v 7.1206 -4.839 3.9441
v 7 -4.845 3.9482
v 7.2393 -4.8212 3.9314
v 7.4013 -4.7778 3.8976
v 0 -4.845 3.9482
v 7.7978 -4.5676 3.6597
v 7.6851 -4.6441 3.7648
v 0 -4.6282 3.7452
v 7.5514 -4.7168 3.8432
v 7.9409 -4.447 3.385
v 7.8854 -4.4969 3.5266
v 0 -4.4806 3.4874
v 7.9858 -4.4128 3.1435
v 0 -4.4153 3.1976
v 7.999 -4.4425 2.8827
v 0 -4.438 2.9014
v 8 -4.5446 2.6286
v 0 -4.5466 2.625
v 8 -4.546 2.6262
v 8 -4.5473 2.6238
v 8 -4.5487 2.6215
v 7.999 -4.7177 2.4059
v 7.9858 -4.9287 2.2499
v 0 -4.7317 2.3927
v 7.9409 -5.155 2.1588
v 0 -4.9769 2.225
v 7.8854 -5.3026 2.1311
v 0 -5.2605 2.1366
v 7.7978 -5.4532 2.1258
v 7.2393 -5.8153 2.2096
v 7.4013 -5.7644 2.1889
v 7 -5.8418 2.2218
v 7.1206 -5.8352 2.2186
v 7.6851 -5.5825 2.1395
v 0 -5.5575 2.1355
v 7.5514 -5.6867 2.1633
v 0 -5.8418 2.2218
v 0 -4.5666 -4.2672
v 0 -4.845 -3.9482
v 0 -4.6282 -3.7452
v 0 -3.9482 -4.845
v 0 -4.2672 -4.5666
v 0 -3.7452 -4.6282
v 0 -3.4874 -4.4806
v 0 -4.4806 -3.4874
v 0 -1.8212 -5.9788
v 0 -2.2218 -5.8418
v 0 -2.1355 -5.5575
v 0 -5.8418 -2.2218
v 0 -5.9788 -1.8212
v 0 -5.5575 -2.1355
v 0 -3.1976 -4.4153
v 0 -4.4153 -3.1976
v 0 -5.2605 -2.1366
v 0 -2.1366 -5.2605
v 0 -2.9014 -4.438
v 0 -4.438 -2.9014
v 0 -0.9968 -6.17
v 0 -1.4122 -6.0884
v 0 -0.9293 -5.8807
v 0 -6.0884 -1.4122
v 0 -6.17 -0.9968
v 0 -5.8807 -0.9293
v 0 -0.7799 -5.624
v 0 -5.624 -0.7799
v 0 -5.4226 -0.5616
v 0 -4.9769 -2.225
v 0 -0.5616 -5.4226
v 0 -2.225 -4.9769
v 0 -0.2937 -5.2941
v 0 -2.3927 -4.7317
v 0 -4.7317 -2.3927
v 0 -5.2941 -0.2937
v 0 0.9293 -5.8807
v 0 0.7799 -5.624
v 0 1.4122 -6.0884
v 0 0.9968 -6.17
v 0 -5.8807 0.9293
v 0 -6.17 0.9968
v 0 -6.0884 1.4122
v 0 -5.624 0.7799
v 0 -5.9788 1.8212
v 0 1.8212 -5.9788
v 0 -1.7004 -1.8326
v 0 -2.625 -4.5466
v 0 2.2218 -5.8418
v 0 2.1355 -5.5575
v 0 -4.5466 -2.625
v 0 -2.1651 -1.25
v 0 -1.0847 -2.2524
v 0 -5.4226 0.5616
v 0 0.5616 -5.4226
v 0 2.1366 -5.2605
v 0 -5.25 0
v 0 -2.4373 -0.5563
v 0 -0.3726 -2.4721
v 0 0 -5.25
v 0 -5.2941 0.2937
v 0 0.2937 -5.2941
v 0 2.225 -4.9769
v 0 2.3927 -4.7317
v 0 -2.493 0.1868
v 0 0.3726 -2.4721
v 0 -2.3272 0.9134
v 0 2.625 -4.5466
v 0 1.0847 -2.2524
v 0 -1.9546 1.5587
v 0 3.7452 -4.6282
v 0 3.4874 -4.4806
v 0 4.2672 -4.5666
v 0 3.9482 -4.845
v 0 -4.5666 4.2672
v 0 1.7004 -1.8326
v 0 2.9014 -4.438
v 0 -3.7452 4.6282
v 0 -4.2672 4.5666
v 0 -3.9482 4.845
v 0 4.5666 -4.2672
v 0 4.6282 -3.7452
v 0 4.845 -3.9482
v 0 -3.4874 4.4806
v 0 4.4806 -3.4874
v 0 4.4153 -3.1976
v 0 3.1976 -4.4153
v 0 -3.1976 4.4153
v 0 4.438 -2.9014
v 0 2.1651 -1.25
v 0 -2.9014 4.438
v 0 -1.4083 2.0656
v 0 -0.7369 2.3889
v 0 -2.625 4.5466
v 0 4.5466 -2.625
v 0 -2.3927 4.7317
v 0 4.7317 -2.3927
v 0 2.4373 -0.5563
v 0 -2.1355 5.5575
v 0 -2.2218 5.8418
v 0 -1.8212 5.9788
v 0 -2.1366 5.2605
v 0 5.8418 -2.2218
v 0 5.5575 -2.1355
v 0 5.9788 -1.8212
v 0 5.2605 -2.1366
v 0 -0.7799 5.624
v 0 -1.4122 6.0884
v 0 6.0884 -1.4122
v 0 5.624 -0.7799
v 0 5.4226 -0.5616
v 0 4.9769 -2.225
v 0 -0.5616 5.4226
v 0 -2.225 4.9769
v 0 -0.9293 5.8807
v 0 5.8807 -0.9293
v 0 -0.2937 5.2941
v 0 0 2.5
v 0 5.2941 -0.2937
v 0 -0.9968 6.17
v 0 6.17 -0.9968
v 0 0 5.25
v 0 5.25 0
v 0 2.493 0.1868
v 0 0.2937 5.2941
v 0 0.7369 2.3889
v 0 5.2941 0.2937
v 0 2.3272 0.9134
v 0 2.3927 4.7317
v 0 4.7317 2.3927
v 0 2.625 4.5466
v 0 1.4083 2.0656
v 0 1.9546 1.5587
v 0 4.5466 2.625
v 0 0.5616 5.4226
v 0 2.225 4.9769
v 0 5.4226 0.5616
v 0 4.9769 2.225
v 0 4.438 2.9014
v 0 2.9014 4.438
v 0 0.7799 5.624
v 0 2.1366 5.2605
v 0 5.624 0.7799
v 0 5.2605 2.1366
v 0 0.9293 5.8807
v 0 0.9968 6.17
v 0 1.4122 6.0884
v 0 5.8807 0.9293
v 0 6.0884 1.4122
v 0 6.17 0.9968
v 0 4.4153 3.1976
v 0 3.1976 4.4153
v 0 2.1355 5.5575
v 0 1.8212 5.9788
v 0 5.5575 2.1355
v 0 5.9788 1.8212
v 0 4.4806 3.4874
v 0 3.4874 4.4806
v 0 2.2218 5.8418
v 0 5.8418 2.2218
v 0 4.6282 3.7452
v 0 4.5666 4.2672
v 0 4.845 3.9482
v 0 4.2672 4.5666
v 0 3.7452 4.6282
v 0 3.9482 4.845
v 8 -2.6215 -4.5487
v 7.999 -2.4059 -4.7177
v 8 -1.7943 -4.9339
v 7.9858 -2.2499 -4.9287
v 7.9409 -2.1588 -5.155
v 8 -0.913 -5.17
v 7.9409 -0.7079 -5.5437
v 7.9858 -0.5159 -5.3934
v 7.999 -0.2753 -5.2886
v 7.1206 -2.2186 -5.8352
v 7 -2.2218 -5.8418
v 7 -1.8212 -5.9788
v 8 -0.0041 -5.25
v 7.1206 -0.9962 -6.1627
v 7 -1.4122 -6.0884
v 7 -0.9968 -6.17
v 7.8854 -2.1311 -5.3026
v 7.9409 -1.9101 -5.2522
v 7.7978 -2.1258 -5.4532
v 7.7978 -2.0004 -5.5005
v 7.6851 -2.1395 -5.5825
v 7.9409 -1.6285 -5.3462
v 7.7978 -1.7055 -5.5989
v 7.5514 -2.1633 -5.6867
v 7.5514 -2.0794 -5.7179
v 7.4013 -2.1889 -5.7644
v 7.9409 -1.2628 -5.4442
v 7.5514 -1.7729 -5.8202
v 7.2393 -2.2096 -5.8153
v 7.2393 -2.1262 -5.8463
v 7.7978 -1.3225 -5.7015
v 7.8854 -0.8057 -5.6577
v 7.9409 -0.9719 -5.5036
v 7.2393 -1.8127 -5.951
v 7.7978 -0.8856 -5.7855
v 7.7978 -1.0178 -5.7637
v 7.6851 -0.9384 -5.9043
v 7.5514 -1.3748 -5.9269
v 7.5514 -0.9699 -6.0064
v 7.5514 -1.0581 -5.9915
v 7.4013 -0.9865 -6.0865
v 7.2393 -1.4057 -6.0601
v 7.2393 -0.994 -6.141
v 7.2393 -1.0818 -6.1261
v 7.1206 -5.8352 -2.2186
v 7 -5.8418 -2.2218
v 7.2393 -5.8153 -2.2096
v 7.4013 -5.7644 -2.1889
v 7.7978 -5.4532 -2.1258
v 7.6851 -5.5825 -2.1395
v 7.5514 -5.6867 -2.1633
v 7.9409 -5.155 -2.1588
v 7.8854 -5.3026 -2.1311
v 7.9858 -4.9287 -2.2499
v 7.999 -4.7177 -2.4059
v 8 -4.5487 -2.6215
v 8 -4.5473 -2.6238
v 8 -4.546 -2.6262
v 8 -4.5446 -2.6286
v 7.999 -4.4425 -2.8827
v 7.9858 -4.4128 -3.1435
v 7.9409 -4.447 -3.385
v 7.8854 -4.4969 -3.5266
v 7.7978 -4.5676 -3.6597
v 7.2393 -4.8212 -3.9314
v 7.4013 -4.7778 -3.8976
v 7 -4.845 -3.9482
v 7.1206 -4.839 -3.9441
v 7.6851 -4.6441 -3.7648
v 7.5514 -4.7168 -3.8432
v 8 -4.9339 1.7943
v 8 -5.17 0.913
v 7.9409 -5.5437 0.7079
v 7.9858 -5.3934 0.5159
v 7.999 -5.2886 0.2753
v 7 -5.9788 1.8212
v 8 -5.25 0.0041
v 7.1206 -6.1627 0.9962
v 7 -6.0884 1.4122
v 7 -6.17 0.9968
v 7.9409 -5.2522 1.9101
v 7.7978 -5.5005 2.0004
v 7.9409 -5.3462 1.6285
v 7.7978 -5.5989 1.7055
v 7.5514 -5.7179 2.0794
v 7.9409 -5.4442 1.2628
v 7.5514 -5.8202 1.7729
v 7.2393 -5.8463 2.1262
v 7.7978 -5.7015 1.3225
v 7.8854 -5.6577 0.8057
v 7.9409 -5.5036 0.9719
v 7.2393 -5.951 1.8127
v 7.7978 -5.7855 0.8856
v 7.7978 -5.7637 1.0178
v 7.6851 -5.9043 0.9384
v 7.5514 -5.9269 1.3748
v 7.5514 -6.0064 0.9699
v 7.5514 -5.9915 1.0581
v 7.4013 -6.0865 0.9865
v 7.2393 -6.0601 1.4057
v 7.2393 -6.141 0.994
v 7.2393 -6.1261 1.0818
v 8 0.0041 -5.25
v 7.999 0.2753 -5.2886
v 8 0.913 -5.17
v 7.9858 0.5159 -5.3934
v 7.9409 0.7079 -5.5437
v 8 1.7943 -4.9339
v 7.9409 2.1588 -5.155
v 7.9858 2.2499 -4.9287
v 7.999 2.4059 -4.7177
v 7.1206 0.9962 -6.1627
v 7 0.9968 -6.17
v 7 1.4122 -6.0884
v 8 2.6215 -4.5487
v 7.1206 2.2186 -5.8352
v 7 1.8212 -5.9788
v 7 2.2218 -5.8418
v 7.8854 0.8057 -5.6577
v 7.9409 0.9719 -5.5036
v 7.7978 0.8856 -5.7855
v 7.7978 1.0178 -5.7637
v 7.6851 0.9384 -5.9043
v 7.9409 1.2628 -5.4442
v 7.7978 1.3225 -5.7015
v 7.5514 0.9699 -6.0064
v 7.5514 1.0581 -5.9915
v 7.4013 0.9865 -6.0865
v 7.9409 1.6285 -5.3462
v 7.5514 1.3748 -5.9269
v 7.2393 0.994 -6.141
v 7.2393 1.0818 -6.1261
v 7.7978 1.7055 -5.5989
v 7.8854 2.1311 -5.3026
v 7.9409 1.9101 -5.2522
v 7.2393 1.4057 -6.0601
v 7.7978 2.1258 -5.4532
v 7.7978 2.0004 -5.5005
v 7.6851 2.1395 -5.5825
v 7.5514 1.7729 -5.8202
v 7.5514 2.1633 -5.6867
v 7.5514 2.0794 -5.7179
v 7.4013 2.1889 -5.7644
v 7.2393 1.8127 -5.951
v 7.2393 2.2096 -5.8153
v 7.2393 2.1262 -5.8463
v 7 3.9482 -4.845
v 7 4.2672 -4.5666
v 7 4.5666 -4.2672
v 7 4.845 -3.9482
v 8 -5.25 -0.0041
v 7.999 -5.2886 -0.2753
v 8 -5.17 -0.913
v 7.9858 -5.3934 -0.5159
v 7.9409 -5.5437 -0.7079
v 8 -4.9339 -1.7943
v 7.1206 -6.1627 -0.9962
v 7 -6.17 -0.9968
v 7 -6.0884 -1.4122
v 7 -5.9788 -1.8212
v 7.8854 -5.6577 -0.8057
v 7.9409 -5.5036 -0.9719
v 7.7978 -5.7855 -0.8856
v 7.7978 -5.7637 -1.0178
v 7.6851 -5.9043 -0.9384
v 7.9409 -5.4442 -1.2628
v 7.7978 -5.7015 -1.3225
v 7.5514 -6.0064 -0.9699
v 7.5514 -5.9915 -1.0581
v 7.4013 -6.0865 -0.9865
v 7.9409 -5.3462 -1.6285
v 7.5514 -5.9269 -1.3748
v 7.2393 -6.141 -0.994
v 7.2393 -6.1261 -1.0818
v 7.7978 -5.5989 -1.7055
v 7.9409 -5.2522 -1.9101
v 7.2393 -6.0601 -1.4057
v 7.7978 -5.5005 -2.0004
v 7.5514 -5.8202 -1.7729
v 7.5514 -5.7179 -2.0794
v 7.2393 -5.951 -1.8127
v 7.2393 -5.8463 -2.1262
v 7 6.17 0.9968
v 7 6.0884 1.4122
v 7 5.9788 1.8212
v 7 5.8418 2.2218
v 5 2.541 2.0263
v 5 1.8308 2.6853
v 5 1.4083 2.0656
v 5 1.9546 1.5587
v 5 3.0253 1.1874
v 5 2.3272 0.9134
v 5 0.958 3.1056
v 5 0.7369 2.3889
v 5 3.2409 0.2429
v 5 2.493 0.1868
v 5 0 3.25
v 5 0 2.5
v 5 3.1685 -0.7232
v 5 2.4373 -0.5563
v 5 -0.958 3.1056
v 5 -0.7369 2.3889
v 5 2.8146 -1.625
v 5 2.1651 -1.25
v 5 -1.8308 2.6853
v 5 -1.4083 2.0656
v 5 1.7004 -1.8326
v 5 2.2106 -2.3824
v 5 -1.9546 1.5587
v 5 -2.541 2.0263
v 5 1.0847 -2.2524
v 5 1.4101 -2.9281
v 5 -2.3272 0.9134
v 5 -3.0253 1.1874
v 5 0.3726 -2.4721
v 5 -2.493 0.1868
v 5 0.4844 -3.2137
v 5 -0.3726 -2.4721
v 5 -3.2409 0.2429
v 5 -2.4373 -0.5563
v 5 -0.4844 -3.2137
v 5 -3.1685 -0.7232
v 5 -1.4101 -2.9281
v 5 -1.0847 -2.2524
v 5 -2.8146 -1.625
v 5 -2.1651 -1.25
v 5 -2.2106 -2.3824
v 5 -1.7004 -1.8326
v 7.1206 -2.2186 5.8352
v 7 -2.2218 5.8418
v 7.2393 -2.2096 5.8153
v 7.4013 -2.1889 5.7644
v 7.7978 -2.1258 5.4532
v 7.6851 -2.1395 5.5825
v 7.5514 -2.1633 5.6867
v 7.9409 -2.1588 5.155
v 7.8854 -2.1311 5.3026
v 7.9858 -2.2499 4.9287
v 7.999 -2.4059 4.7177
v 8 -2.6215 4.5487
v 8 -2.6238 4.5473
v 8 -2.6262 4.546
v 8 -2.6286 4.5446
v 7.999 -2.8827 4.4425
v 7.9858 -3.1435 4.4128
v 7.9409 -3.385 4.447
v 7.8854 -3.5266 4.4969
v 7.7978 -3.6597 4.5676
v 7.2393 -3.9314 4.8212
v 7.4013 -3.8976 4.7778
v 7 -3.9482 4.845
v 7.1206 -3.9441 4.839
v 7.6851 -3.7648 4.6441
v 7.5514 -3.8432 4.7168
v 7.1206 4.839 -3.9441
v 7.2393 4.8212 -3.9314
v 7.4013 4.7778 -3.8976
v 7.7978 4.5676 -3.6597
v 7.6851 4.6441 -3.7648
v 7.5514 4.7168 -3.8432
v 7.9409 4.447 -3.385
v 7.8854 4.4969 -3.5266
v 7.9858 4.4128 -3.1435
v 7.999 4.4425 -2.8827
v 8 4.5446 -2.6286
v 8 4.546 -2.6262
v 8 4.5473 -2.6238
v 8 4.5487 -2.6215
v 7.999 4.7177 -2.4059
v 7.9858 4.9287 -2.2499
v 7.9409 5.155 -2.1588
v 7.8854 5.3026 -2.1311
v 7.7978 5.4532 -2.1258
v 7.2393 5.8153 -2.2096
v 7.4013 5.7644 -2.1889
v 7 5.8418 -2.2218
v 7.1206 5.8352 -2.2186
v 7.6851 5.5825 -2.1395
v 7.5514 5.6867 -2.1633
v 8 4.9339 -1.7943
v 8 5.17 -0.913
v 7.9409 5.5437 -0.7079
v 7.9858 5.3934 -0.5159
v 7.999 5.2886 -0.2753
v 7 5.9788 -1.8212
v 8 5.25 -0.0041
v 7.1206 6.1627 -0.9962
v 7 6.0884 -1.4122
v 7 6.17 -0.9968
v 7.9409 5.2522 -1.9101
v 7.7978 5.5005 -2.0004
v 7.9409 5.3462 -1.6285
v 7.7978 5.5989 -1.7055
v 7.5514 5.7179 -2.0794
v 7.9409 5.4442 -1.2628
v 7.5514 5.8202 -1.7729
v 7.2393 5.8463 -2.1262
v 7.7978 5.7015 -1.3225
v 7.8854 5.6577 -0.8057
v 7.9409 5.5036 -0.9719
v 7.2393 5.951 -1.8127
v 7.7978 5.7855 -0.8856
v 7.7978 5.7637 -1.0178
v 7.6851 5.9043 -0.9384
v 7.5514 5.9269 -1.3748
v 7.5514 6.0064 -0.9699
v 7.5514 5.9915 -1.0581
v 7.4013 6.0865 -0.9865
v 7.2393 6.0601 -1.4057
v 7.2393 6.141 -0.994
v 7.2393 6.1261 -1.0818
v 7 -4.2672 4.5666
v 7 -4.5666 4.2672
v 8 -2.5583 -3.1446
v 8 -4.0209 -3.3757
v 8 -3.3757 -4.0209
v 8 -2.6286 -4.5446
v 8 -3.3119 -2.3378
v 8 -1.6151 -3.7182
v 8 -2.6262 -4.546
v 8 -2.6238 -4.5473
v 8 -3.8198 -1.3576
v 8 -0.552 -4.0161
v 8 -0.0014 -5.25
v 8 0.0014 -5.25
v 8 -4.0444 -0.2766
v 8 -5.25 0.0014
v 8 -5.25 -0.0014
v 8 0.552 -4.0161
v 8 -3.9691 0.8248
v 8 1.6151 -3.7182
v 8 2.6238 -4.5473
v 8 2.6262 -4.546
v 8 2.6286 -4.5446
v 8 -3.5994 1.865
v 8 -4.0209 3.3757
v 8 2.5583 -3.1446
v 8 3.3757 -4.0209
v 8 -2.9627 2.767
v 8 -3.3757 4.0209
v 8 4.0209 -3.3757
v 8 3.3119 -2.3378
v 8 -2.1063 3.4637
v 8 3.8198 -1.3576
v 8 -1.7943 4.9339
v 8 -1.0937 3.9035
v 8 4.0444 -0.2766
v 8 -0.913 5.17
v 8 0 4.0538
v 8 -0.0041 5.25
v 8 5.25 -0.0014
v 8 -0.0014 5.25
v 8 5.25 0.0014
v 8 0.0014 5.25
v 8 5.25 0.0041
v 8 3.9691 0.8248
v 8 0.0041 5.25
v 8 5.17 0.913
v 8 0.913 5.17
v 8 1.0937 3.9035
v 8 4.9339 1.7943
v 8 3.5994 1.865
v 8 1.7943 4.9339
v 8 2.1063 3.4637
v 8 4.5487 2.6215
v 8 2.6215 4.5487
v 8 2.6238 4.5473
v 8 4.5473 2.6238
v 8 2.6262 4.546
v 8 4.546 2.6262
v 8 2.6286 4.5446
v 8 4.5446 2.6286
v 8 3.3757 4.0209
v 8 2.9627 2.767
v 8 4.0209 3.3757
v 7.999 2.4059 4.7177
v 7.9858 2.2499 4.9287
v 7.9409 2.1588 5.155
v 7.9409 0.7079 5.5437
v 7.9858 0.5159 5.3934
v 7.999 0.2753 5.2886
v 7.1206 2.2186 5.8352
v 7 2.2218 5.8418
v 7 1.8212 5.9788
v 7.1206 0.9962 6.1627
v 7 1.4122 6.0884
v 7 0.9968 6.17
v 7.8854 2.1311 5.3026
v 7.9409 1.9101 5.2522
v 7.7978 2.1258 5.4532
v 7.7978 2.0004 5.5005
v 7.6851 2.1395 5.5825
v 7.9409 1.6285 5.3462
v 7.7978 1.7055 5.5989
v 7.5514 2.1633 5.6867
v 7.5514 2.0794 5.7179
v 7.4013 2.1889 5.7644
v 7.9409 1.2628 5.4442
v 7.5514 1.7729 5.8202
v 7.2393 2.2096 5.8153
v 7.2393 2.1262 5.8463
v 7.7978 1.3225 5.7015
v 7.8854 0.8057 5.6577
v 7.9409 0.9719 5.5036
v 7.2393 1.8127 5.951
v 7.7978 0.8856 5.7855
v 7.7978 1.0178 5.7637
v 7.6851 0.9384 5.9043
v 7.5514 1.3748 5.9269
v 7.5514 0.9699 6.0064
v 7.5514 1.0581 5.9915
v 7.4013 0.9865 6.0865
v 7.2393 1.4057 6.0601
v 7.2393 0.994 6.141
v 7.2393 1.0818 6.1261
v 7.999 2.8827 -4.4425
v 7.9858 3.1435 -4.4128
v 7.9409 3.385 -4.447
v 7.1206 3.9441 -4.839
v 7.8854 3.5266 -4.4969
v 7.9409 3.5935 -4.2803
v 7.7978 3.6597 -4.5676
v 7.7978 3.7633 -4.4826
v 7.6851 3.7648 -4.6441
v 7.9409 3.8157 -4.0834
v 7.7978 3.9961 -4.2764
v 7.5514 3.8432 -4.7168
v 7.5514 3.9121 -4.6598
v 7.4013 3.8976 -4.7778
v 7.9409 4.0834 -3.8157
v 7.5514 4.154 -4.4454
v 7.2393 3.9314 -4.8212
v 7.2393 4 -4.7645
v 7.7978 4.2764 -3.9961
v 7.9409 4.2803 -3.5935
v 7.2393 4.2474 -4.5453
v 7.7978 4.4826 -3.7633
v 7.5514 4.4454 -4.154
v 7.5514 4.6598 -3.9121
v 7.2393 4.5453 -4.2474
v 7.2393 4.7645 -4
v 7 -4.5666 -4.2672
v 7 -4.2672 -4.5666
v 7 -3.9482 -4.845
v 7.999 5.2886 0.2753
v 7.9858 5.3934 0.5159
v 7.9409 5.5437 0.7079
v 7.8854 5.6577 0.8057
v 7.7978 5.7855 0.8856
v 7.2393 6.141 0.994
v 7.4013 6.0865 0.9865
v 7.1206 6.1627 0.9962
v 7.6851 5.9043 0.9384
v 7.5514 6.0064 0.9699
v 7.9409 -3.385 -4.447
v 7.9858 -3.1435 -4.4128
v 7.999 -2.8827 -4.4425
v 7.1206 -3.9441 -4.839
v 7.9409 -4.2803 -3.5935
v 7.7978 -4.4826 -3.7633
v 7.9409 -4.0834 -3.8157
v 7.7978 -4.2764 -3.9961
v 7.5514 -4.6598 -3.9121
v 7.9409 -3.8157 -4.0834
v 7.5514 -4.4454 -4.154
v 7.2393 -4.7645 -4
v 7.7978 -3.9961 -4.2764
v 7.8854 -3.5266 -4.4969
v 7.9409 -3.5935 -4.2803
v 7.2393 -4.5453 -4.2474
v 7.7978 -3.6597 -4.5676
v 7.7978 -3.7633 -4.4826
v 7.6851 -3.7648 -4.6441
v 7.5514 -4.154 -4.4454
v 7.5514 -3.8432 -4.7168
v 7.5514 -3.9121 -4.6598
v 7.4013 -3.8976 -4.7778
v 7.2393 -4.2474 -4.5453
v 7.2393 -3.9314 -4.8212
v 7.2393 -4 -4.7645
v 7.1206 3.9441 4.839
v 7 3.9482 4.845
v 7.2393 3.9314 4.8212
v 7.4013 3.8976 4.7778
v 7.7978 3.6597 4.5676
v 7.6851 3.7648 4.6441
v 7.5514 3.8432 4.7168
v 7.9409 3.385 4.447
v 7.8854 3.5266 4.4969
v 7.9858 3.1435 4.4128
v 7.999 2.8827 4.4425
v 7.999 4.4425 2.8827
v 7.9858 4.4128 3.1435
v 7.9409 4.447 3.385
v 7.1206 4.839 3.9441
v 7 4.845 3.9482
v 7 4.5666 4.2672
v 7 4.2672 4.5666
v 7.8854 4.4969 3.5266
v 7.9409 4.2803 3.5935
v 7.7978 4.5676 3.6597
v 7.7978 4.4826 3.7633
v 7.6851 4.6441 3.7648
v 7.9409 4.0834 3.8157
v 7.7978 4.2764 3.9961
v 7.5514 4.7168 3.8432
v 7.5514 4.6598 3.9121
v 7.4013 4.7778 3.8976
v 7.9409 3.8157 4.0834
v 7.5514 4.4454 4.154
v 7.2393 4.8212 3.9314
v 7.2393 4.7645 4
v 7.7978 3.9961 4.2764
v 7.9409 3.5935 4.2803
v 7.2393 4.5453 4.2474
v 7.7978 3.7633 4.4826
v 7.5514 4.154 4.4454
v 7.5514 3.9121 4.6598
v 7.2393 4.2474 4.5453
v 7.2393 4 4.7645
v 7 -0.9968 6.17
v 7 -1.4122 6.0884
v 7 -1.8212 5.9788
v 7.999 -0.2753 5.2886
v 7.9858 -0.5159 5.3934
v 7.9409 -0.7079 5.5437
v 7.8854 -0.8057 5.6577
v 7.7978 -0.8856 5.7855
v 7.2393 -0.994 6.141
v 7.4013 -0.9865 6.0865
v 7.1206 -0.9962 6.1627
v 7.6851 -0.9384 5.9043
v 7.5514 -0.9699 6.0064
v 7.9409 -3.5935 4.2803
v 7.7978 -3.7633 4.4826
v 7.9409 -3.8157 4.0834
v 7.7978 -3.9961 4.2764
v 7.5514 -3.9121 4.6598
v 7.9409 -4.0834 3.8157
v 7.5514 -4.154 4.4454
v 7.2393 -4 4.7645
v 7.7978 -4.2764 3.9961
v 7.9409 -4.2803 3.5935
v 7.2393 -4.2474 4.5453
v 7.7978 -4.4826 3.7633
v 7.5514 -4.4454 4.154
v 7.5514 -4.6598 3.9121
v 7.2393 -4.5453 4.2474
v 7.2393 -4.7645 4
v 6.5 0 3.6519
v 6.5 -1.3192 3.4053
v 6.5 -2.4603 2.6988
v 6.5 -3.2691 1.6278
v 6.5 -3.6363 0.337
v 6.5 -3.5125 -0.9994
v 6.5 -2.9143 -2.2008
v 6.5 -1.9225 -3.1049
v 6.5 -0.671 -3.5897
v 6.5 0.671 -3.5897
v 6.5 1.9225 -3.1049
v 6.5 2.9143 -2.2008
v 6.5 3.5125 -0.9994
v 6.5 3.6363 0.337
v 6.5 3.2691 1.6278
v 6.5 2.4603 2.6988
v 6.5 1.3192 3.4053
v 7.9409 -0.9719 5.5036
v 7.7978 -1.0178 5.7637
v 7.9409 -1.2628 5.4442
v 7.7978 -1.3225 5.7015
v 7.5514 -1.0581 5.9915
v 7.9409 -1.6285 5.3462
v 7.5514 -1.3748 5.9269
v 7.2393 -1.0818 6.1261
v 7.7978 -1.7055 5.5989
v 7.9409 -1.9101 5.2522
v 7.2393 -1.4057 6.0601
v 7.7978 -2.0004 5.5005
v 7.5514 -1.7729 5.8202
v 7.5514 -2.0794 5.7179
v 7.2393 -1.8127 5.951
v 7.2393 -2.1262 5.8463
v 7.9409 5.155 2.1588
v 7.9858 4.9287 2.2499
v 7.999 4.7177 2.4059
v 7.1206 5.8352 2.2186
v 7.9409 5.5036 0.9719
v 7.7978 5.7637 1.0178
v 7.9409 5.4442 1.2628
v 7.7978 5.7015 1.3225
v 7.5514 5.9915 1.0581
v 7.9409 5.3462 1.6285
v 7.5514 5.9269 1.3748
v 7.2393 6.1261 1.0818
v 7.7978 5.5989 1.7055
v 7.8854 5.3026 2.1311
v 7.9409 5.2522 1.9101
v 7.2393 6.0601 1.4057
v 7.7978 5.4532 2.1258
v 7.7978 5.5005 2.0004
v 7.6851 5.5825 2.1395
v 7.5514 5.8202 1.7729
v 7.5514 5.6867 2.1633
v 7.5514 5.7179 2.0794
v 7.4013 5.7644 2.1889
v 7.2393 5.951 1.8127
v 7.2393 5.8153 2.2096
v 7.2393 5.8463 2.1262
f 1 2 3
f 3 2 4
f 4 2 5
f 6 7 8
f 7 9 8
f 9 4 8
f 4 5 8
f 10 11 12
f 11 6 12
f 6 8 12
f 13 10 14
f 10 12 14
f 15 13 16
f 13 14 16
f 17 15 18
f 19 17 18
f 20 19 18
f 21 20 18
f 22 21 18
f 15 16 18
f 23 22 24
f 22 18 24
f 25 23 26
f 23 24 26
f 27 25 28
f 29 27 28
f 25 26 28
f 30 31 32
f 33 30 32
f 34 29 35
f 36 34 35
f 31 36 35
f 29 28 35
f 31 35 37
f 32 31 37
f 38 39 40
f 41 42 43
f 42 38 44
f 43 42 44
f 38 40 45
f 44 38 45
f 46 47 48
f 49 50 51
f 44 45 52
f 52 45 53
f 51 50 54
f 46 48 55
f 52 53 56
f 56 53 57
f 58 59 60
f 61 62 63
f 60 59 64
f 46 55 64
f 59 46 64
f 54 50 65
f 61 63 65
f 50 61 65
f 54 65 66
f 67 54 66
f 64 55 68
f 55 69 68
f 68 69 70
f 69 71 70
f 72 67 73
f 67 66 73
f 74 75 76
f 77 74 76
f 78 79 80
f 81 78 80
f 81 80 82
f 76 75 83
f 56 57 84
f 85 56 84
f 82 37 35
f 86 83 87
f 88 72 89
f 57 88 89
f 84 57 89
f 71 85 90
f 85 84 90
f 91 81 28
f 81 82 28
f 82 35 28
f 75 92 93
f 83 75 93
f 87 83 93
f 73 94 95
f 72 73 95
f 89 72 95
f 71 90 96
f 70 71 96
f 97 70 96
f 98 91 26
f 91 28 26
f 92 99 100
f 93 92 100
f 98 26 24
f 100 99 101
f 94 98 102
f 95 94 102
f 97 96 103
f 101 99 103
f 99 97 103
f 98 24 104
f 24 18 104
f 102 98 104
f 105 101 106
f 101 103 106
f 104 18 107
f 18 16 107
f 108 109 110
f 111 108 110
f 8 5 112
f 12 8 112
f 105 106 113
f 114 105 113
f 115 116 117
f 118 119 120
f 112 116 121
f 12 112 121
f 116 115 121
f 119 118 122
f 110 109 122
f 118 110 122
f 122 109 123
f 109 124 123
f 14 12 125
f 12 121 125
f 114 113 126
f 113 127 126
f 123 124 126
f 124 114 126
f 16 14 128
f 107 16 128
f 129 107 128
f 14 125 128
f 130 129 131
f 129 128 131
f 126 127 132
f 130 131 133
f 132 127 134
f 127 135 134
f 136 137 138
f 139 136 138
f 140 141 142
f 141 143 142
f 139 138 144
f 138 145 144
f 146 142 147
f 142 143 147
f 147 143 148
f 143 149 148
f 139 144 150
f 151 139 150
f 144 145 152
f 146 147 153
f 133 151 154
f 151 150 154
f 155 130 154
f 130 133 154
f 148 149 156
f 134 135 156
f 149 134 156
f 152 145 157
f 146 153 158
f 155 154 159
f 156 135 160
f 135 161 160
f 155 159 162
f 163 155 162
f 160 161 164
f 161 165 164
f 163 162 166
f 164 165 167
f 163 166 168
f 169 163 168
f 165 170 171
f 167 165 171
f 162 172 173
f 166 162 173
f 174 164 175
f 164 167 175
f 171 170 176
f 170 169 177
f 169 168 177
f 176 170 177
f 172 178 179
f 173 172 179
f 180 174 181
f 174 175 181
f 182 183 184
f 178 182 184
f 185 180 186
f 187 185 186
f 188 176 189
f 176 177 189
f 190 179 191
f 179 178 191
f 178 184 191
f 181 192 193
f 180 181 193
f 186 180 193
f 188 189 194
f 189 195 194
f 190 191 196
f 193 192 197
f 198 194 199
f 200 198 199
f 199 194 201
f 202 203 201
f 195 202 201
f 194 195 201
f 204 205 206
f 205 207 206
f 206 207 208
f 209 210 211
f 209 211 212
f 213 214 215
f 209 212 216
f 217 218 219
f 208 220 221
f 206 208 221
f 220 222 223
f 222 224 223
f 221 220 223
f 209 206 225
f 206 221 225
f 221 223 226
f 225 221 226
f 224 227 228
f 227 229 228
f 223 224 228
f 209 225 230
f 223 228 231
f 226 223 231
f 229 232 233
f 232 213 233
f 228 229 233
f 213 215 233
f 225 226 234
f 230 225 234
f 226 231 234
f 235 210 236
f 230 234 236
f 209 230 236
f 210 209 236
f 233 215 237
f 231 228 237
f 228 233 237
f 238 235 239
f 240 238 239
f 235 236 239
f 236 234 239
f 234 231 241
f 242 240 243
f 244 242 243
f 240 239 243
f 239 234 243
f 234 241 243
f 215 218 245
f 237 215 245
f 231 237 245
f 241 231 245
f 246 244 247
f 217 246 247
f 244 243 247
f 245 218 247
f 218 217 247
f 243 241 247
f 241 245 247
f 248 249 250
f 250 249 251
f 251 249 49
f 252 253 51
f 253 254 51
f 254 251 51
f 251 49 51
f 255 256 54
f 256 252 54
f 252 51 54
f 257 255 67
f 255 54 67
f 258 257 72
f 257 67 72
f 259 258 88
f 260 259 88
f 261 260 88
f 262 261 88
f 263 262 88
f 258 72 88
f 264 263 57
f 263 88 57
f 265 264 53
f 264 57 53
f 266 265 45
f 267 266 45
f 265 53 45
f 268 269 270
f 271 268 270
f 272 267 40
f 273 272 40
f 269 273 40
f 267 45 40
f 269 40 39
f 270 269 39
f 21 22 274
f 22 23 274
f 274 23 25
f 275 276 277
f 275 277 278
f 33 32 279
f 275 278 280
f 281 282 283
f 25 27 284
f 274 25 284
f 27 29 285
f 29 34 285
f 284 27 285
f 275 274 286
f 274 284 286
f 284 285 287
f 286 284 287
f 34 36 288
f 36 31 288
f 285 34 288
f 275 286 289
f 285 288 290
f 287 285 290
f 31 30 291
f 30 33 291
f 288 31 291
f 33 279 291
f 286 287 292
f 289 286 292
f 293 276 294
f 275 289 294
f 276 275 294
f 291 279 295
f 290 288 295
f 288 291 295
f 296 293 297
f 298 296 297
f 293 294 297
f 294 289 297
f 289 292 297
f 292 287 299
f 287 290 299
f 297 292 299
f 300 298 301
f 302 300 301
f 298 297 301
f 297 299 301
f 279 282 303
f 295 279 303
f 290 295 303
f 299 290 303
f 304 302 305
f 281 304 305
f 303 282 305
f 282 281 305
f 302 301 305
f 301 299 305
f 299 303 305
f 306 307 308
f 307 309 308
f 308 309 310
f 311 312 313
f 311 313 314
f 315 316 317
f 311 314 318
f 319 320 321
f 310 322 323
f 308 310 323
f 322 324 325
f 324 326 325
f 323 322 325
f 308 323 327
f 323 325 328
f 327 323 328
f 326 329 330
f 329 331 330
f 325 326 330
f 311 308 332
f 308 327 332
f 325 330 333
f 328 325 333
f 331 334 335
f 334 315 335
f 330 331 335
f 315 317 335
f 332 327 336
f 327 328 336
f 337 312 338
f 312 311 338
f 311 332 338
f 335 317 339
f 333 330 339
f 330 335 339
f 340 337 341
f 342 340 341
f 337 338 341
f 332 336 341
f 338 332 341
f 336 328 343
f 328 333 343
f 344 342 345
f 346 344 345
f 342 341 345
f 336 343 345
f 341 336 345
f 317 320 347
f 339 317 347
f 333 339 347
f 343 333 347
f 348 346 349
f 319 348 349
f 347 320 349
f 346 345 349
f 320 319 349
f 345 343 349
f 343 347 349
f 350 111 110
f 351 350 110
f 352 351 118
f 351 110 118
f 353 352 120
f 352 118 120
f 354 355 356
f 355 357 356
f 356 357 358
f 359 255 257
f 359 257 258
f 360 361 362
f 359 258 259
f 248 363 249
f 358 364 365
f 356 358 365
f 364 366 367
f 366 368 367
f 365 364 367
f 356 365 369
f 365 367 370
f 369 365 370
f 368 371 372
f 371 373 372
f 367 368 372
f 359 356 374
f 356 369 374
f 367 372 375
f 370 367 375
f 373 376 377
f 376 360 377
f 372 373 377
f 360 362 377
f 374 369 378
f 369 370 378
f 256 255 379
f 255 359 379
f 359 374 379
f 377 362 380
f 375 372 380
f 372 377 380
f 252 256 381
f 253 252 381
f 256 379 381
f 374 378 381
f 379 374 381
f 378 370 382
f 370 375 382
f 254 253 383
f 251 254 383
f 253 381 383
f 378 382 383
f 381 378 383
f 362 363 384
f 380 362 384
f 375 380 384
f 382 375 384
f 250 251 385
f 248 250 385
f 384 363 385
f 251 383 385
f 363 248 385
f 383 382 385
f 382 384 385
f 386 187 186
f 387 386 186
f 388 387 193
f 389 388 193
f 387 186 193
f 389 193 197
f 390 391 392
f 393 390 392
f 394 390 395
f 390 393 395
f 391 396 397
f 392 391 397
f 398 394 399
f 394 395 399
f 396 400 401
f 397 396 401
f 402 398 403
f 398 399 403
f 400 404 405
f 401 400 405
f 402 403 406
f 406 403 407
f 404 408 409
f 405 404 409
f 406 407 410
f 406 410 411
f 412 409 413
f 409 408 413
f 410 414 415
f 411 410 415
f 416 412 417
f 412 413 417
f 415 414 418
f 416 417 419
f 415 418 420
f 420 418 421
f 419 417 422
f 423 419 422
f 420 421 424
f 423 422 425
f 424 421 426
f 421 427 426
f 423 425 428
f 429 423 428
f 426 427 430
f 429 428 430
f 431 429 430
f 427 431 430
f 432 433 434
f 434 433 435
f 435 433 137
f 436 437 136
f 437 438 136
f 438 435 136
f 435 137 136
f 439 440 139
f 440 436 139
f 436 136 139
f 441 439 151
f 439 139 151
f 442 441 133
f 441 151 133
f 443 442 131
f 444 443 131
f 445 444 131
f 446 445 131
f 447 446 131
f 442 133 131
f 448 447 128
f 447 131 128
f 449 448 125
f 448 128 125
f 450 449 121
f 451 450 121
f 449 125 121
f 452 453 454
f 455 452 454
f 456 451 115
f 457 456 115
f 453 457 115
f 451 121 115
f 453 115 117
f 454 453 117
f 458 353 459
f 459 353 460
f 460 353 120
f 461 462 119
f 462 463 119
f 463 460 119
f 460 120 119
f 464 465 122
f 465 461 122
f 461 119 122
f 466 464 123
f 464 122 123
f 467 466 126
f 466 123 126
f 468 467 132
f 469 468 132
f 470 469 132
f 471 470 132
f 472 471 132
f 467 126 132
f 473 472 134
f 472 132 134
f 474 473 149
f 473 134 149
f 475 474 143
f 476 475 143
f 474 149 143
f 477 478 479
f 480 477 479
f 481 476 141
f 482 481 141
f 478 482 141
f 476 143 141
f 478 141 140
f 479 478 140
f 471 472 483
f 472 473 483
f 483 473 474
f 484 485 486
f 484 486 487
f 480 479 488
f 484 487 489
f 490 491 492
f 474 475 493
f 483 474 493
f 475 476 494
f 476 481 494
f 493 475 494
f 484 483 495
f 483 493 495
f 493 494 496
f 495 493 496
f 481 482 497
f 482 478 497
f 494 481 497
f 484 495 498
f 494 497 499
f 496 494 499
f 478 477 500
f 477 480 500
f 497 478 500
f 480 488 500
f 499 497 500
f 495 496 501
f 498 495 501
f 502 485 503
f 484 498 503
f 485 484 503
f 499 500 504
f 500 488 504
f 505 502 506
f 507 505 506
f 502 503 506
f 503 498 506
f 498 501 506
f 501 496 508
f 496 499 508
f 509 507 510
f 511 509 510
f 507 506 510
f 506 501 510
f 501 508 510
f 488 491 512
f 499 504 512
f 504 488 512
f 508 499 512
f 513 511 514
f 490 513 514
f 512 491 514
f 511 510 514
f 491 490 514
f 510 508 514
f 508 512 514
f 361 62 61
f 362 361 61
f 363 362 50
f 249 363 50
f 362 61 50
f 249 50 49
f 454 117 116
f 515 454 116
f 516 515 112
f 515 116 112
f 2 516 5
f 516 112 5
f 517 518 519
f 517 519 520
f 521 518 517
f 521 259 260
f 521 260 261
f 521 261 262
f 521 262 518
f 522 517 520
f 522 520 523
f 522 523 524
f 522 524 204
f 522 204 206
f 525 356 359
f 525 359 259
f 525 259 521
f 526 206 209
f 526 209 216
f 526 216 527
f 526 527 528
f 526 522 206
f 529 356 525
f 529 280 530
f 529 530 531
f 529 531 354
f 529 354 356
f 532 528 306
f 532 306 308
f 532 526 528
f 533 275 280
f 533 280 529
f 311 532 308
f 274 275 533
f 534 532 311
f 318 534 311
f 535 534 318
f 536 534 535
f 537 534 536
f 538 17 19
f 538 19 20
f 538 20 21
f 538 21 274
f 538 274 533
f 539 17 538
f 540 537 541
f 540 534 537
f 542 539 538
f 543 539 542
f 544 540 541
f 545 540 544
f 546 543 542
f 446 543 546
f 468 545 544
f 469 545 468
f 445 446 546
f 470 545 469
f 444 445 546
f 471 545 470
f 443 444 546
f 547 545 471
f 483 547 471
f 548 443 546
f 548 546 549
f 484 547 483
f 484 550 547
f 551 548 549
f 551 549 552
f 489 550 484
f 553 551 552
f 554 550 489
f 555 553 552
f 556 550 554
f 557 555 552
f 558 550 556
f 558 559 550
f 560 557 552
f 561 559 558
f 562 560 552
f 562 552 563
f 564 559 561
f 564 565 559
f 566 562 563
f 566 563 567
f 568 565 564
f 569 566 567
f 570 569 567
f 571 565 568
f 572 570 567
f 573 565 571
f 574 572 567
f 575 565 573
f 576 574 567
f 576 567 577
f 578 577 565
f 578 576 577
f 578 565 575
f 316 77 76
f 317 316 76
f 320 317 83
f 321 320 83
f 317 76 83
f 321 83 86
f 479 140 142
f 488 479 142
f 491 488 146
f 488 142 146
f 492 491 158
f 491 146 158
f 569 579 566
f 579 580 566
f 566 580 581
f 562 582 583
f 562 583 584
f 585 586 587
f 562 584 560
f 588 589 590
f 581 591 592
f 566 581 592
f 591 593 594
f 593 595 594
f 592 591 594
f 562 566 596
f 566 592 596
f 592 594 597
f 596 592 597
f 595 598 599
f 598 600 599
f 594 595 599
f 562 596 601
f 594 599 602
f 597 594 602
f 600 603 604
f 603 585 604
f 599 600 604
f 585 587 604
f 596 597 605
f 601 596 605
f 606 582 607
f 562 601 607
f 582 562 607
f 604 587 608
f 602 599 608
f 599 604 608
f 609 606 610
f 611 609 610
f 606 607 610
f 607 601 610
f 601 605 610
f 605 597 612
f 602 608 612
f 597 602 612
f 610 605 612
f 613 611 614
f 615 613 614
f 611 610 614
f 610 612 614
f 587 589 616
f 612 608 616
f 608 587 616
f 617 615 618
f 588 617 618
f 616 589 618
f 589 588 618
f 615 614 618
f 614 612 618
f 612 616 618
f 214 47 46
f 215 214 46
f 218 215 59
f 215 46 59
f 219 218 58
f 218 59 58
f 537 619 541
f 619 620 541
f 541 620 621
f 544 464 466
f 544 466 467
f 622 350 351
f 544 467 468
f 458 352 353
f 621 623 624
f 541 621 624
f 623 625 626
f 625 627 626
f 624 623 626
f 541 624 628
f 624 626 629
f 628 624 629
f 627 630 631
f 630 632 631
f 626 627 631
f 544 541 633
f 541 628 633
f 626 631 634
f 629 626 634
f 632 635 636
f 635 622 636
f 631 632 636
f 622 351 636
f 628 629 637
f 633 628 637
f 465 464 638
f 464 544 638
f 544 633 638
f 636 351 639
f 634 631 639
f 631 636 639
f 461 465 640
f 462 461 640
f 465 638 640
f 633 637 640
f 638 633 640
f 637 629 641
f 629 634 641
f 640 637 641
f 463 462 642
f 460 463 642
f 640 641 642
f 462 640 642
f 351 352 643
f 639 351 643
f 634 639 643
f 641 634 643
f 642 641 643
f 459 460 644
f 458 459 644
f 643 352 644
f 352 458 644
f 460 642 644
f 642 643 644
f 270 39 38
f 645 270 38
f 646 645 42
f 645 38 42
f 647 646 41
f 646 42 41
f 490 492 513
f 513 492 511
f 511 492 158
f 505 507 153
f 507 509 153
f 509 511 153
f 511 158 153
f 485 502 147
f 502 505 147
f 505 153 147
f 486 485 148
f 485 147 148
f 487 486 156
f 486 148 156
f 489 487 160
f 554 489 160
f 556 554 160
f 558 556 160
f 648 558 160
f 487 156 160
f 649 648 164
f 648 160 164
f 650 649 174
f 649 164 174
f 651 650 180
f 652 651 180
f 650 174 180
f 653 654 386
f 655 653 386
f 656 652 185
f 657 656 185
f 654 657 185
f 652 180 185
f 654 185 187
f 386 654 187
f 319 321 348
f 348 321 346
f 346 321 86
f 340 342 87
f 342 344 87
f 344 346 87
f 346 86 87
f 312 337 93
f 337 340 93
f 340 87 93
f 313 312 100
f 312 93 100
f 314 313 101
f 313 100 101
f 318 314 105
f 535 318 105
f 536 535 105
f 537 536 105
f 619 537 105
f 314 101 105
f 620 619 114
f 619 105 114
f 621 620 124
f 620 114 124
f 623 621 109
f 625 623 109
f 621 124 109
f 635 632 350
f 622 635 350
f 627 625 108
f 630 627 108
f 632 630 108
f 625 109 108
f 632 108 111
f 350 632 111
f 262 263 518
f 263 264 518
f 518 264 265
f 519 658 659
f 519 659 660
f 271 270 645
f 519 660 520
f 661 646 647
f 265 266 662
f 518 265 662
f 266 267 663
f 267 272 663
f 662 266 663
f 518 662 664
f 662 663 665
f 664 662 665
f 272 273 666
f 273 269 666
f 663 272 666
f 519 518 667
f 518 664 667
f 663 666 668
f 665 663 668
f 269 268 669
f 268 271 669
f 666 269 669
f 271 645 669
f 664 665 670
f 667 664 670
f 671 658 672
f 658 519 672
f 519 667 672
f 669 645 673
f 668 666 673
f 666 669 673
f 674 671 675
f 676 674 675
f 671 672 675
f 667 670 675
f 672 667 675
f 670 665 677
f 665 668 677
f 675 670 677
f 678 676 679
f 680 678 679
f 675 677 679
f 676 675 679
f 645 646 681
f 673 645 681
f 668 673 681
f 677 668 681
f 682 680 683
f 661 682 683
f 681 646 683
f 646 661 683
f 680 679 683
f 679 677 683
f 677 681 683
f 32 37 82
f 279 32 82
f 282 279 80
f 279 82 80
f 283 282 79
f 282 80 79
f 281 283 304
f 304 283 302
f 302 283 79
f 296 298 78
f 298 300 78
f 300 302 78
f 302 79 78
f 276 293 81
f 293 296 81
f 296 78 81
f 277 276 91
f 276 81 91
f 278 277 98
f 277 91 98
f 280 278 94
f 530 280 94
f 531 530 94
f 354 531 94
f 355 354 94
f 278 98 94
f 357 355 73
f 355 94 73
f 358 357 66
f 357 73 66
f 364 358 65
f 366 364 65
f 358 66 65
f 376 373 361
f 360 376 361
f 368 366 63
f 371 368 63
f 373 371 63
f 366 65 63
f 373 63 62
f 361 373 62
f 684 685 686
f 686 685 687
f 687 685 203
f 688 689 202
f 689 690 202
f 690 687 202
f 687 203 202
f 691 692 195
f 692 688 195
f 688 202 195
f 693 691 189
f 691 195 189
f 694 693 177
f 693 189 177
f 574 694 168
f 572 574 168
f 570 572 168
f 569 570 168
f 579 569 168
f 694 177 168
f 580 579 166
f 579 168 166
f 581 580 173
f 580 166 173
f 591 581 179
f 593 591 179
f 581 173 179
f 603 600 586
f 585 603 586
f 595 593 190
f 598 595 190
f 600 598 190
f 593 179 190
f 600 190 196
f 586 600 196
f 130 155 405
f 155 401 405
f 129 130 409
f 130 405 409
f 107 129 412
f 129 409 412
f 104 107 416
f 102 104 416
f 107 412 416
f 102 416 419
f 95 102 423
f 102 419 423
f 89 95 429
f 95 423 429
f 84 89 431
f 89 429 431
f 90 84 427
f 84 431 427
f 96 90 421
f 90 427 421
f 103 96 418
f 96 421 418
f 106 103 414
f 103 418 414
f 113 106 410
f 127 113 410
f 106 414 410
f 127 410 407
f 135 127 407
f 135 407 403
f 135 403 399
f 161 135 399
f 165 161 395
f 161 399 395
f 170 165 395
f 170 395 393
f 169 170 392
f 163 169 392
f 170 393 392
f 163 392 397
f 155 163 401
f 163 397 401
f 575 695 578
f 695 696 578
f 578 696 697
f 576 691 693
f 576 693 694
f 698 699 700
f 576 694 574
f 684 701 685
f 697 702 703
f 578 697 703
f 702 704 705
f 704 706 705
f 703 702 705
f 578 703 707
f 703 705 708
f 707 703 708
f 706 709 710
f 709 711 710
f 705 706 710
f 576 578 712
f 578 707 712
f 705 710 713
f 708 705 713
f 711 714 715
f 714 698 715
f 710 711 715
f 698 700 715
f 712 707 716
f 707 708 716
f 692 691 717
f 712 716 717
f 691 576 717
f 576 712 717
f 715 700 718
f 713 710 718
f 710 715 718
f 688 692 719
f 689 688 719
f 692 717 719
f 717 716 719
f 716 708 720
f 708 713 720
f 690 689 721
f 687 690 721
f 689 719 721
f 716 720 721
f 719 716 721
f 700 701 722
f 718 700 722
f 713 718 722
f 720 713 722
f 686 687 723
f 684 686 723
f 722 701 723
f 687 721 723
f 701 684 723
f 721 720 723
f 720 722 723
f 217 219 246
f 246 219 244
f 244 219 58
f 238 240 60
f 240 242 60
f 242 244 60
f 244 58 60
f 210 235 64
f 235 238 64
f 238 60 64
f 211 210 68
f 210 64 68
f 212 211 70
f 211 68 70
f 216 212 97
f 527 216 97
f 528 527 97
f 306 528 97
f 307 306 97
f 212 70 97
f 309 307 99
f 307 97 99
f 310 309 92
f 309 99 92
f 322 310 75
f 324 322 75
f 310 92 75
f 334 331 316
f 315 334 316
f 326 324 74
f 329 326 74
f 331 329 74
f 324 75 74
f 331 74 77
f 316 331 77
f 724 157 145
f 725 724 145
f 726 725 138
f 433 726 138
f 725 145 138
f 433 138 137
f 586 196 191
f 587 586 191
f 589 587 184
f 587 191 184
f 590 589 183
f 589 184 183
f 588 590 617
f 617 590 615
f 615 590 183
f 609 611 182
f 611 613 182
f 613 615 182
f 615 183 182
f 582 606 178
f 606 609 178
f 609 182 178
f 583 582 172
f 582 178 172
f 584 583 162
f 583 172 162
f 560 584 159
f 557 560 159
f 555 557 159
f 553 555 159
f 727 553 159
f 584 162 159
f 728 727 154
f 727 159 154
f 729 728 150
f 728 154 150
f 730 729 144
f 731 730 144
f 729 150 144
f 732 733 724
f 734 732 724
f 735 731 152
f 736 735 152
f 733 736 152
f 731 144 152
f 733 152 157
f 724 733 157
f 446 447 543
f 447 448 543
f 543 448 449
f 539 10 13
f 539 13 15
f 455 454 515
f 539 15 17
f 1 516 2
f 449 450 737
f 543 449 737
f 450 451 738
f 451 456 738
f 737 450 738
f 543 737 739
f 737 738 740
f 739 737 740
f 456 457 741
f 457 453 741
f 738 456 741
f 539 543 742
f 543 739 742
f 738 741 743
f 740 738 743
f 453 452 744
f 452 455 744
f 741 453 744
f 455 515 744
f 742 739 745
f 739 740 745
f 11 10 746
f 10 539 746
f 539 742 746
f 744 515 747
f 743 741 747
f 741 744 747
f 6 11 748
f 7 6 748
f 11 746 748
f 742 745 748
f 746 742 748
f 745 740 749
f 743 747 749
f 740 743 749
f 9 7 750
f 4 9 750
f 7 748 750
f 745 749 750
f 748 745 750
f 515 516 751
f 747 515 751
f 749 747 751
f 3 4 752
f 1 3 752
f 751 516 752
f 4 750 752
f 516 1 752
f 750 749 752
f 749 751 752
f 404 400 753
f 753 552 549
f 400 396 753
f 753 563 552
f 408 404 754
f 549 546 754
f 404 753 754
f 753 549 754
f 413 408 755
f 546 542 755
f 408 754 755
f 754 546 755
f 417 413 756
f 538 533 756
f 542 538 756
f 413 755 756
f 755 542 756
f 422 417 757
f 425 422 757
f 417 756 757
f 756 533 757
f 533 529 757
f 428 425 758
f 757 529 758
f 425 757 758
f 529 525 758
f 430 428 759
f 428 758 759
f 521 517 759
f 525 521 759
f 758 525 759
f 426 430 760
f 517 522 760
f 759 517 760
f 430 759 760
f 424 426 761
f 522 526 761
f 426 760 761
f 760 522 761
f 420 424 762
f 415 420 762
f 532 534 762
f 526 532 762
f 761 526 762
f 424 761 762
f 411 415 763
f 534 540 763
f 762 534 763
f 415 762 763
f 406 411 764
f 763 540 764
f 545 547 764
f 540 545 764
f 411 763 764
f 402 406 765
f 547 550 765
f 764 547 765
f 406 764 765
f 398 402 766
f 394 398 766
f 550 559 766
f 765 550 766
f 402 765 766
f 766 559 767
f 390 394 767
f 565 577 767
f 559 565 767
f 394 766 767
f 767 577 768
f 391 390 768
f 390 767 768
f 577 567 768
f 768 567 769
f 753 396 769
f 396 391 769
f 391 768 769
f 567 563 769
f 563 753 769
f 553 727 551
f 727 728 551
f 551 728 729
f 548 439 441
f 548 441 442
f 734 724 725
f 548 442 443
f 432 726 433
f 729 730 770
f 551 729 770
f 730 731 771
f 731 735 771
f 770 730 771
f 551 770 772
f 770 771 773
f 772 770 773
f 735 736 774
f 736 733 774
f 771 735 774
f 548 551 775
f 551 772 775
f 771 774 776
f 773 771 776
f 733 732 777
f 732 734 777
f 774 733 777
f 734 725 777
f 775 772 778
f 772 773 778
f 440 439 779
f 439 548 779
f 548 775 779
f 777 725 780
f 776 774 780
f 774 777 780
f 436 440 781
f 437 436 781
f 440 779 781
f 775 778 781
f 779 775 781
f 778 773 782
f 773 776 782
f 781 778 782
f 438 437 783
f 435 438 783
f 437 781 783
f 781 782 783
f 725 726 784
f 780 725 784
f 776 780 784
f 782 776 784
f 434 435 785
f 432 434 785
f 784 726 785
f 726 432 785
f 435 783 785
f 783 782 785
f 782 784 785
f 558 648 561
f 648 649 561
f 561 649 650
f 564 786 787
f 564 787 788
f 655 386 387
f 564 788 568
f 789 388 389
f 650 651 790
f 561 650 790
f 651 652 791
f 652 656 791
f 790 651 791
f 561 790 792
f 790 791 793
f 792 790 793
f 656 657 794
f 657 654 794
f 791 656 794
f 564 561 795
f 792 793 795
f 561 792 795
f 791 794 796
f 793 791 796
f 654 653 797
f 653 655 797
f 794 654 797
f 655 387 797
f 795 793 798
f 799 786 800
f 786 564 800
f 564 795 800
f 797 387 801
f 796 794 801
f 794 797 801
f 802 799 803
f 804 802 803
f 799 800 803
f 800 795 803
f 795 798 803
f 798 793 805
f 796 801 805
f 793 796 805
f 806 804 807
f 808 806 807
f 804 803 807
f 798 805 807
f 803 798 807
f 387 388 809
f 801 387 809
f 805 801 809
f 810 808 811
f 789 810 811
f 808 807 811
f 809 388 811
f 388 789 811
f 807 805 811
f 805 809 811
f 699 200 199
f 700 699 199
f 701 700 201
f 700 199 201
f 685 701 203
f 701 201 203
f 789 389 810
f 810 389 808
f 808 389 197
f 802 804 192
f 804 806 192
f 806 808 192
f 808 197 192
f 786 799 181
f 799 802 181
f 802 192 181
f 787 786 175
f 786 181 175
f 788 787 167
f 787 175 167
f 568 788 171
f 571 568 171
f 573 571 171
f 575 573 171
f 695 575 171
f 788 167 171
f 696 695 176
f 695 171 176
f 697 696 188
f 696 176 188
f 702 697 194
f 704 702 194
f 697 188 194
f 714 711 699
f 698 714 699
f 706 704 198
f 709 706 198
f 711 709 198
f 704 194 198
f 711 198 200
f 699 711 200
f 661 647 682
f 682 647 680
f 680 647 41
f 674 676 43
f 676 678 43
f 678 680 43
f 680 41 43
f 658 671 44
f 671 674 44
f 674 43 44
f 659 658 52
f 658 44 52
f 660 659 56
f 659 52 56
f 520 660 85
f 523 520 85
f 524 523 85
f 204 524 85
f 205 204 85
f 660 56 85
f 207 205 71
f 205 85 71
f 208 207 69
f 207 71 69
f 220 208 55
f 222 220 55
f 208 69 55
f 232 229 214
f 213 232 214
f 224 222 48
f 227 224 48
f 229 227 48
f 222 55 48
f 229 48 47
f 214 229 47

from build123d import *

# Parameters (mm, degrees)
F2_R     = 4.0538475773
F3_DEPTH = 8
F4_R     = 0.99999


# Not quite as in the source:
# - a fillet or chamfer is up to 0.001 mm smaller than in the source, because OpenCascade refuses the exact size


with BuildPart() as f1:
    # F0 (on Front) → F1 (revolve)
    with BuildSketch(Plane.XZ):
        Polygon((0, 4.0538475773), (0, 2.5), (5, 2.5), (5, 3.25), (8, 4.0538475773), align=None)
    revolve(axis=Axis((3.9731631987, 0, 0), (1, 0, 0)))

    # F2 (on Right) → F3 (join)
    with BuildSketch(Plane.YZ):
        with BuildLine():
            ThreePointArc((-2.2217503258, 5.8417741731), (-2.625, 4.5466333699), (-3.9482496742, 4.8449793096))
            ThreePointArc((-3.9482496742, 4.8449793096), (-4.4194173824, 4.4194173824), (-4.8449793096, 3.9482496742))
            ThreePointArc((-4.8449793096, 3.9482496742), (-4.5466333699, 2.625), (-5.8417741731, 2.2217503258))
            ThreePointArc((-5.8417741731, 2.2217503258), (-6.0370364143, 1.6176190319), (-6.17, 0.9967948636))
            ThreePointArc((-6.17, 0.9967948636), (-5.25, 0), (-6.17, -0.9967948636))
            ThreePointArc((-6.17, -0.9967948636), (-6.0370364143, -1.6176190319), (-5.8417741731, -2.2217503258))
            ThreePointArc((-5.8417741731, -2.2217503258), (-4.5466333699, -2.625), (-4.8449793096, -3.9482496742))
            ThreePointArc((-4.8449793096, -3.9482496742), (-4.4194173824, -4.4194173824), (-3.9482496742, -4.8449793096))
            ThreePointArc((-3.9482496742, -4.8449793096), (-2.625, -4.5466333699), (-2.2217503258, -5.8417741731))
            ThreePointArc((-2.2217503258, -5.8417741731), (-1.6176190319, -6.0370364143), (-0.9967948636, -6.17))
            ThreePointArc((-0.9967948636, -6.17), (0, -5.25), (0.9967948636, -6.17))
            ThreePointArc((0.9967948636, -6.17), (1.6176190319, -6.0370364143), (2.2217503258, -5.8417741731))
            ThreePointArc((2.2217503258, -5.8417741731), (2.625, -4.5466333699), (3.9482496742, -4.8449793096))
            ThreePointArc((3.9482496742, -4.8449793096), (4.4194173824, -4.4194173824), (4.8449793096, -3.9482496742))
            ThreePointArc((4.8449793096, -3.9482496742), (4.5466333699, -2.625), (5.8417741731, -2.2217503258))
            ThreePointArc((5.8417741731, -2.2217503258), (6.0370364143, -1.6176190319), (6.17, -0.9967948636))
            ThreePointArc((6.17, -0.9967948636), (5.25, 0), (6.17, 0.9967948636))
            ThreePointArc((6.17, 0.9967948636), (6.0370364143, 1.6176190319), (5.8417741731, 2.2217503258))
            ThreePointArc((5.8417741731, 2.2217503258), (4.5466333699, 2.625), (4.8449793096, 3.9482496742))
            ThreePointArc((4.8449793096, 3.9482496742), (4.4194173824, 4.4194173824), (3.9482496742, 4.8449793096))
            ThreePointArc((3.9482496742, 4.8449793096), (2.625, 4.5466333699), (2.2217503258, 5.8417741731))
            ThreePointArc((2.2217503258, 5.8417741731), (1.6176190319, 6.0370364143), (0.9967948636, 6.17))
            ThreePointArc((0.9967948636, 6.17), (0, 5.25), (-0.9967948636, 6.17))
            ThreePointArc((-0.9967948636, 6.17), (-1.6176190319, 6.0370364143), (-2.2217503258, 5.8417741731))
        make_face()
        Circle(F2_R, mode=Mode.SUBTRACT)
    extrude(amount=F3_DEPTH)

    # F4 (radius 1 in the source; OpenCascade refuses exactly that, so slightly less here)
    f4_edges = [f1.edges().sort_by_distance(p)[0] for p in [
        (8, -4.419417, 4.419417),
        (8, -1.617619, 6.037036),
        (8, 1.617619, 6.037036),
        (8, 4.419417, 4.419417),
        (8, 6.037036, 1.617619),
        (8, 6.037036, -1.617619),
        (8, 4.419417, -4.419417),
        (8, 1.617619, -6.037036),
        (8, -1.617619, -6.037036),
        (8, -4.419417, -4.419417),
        (8, -6.037036, -1.617619),
        (8, -6.037036, 1.617619),
    ]]
    fillet(f4_edges, radius=F4_R)


solid = f1.part
